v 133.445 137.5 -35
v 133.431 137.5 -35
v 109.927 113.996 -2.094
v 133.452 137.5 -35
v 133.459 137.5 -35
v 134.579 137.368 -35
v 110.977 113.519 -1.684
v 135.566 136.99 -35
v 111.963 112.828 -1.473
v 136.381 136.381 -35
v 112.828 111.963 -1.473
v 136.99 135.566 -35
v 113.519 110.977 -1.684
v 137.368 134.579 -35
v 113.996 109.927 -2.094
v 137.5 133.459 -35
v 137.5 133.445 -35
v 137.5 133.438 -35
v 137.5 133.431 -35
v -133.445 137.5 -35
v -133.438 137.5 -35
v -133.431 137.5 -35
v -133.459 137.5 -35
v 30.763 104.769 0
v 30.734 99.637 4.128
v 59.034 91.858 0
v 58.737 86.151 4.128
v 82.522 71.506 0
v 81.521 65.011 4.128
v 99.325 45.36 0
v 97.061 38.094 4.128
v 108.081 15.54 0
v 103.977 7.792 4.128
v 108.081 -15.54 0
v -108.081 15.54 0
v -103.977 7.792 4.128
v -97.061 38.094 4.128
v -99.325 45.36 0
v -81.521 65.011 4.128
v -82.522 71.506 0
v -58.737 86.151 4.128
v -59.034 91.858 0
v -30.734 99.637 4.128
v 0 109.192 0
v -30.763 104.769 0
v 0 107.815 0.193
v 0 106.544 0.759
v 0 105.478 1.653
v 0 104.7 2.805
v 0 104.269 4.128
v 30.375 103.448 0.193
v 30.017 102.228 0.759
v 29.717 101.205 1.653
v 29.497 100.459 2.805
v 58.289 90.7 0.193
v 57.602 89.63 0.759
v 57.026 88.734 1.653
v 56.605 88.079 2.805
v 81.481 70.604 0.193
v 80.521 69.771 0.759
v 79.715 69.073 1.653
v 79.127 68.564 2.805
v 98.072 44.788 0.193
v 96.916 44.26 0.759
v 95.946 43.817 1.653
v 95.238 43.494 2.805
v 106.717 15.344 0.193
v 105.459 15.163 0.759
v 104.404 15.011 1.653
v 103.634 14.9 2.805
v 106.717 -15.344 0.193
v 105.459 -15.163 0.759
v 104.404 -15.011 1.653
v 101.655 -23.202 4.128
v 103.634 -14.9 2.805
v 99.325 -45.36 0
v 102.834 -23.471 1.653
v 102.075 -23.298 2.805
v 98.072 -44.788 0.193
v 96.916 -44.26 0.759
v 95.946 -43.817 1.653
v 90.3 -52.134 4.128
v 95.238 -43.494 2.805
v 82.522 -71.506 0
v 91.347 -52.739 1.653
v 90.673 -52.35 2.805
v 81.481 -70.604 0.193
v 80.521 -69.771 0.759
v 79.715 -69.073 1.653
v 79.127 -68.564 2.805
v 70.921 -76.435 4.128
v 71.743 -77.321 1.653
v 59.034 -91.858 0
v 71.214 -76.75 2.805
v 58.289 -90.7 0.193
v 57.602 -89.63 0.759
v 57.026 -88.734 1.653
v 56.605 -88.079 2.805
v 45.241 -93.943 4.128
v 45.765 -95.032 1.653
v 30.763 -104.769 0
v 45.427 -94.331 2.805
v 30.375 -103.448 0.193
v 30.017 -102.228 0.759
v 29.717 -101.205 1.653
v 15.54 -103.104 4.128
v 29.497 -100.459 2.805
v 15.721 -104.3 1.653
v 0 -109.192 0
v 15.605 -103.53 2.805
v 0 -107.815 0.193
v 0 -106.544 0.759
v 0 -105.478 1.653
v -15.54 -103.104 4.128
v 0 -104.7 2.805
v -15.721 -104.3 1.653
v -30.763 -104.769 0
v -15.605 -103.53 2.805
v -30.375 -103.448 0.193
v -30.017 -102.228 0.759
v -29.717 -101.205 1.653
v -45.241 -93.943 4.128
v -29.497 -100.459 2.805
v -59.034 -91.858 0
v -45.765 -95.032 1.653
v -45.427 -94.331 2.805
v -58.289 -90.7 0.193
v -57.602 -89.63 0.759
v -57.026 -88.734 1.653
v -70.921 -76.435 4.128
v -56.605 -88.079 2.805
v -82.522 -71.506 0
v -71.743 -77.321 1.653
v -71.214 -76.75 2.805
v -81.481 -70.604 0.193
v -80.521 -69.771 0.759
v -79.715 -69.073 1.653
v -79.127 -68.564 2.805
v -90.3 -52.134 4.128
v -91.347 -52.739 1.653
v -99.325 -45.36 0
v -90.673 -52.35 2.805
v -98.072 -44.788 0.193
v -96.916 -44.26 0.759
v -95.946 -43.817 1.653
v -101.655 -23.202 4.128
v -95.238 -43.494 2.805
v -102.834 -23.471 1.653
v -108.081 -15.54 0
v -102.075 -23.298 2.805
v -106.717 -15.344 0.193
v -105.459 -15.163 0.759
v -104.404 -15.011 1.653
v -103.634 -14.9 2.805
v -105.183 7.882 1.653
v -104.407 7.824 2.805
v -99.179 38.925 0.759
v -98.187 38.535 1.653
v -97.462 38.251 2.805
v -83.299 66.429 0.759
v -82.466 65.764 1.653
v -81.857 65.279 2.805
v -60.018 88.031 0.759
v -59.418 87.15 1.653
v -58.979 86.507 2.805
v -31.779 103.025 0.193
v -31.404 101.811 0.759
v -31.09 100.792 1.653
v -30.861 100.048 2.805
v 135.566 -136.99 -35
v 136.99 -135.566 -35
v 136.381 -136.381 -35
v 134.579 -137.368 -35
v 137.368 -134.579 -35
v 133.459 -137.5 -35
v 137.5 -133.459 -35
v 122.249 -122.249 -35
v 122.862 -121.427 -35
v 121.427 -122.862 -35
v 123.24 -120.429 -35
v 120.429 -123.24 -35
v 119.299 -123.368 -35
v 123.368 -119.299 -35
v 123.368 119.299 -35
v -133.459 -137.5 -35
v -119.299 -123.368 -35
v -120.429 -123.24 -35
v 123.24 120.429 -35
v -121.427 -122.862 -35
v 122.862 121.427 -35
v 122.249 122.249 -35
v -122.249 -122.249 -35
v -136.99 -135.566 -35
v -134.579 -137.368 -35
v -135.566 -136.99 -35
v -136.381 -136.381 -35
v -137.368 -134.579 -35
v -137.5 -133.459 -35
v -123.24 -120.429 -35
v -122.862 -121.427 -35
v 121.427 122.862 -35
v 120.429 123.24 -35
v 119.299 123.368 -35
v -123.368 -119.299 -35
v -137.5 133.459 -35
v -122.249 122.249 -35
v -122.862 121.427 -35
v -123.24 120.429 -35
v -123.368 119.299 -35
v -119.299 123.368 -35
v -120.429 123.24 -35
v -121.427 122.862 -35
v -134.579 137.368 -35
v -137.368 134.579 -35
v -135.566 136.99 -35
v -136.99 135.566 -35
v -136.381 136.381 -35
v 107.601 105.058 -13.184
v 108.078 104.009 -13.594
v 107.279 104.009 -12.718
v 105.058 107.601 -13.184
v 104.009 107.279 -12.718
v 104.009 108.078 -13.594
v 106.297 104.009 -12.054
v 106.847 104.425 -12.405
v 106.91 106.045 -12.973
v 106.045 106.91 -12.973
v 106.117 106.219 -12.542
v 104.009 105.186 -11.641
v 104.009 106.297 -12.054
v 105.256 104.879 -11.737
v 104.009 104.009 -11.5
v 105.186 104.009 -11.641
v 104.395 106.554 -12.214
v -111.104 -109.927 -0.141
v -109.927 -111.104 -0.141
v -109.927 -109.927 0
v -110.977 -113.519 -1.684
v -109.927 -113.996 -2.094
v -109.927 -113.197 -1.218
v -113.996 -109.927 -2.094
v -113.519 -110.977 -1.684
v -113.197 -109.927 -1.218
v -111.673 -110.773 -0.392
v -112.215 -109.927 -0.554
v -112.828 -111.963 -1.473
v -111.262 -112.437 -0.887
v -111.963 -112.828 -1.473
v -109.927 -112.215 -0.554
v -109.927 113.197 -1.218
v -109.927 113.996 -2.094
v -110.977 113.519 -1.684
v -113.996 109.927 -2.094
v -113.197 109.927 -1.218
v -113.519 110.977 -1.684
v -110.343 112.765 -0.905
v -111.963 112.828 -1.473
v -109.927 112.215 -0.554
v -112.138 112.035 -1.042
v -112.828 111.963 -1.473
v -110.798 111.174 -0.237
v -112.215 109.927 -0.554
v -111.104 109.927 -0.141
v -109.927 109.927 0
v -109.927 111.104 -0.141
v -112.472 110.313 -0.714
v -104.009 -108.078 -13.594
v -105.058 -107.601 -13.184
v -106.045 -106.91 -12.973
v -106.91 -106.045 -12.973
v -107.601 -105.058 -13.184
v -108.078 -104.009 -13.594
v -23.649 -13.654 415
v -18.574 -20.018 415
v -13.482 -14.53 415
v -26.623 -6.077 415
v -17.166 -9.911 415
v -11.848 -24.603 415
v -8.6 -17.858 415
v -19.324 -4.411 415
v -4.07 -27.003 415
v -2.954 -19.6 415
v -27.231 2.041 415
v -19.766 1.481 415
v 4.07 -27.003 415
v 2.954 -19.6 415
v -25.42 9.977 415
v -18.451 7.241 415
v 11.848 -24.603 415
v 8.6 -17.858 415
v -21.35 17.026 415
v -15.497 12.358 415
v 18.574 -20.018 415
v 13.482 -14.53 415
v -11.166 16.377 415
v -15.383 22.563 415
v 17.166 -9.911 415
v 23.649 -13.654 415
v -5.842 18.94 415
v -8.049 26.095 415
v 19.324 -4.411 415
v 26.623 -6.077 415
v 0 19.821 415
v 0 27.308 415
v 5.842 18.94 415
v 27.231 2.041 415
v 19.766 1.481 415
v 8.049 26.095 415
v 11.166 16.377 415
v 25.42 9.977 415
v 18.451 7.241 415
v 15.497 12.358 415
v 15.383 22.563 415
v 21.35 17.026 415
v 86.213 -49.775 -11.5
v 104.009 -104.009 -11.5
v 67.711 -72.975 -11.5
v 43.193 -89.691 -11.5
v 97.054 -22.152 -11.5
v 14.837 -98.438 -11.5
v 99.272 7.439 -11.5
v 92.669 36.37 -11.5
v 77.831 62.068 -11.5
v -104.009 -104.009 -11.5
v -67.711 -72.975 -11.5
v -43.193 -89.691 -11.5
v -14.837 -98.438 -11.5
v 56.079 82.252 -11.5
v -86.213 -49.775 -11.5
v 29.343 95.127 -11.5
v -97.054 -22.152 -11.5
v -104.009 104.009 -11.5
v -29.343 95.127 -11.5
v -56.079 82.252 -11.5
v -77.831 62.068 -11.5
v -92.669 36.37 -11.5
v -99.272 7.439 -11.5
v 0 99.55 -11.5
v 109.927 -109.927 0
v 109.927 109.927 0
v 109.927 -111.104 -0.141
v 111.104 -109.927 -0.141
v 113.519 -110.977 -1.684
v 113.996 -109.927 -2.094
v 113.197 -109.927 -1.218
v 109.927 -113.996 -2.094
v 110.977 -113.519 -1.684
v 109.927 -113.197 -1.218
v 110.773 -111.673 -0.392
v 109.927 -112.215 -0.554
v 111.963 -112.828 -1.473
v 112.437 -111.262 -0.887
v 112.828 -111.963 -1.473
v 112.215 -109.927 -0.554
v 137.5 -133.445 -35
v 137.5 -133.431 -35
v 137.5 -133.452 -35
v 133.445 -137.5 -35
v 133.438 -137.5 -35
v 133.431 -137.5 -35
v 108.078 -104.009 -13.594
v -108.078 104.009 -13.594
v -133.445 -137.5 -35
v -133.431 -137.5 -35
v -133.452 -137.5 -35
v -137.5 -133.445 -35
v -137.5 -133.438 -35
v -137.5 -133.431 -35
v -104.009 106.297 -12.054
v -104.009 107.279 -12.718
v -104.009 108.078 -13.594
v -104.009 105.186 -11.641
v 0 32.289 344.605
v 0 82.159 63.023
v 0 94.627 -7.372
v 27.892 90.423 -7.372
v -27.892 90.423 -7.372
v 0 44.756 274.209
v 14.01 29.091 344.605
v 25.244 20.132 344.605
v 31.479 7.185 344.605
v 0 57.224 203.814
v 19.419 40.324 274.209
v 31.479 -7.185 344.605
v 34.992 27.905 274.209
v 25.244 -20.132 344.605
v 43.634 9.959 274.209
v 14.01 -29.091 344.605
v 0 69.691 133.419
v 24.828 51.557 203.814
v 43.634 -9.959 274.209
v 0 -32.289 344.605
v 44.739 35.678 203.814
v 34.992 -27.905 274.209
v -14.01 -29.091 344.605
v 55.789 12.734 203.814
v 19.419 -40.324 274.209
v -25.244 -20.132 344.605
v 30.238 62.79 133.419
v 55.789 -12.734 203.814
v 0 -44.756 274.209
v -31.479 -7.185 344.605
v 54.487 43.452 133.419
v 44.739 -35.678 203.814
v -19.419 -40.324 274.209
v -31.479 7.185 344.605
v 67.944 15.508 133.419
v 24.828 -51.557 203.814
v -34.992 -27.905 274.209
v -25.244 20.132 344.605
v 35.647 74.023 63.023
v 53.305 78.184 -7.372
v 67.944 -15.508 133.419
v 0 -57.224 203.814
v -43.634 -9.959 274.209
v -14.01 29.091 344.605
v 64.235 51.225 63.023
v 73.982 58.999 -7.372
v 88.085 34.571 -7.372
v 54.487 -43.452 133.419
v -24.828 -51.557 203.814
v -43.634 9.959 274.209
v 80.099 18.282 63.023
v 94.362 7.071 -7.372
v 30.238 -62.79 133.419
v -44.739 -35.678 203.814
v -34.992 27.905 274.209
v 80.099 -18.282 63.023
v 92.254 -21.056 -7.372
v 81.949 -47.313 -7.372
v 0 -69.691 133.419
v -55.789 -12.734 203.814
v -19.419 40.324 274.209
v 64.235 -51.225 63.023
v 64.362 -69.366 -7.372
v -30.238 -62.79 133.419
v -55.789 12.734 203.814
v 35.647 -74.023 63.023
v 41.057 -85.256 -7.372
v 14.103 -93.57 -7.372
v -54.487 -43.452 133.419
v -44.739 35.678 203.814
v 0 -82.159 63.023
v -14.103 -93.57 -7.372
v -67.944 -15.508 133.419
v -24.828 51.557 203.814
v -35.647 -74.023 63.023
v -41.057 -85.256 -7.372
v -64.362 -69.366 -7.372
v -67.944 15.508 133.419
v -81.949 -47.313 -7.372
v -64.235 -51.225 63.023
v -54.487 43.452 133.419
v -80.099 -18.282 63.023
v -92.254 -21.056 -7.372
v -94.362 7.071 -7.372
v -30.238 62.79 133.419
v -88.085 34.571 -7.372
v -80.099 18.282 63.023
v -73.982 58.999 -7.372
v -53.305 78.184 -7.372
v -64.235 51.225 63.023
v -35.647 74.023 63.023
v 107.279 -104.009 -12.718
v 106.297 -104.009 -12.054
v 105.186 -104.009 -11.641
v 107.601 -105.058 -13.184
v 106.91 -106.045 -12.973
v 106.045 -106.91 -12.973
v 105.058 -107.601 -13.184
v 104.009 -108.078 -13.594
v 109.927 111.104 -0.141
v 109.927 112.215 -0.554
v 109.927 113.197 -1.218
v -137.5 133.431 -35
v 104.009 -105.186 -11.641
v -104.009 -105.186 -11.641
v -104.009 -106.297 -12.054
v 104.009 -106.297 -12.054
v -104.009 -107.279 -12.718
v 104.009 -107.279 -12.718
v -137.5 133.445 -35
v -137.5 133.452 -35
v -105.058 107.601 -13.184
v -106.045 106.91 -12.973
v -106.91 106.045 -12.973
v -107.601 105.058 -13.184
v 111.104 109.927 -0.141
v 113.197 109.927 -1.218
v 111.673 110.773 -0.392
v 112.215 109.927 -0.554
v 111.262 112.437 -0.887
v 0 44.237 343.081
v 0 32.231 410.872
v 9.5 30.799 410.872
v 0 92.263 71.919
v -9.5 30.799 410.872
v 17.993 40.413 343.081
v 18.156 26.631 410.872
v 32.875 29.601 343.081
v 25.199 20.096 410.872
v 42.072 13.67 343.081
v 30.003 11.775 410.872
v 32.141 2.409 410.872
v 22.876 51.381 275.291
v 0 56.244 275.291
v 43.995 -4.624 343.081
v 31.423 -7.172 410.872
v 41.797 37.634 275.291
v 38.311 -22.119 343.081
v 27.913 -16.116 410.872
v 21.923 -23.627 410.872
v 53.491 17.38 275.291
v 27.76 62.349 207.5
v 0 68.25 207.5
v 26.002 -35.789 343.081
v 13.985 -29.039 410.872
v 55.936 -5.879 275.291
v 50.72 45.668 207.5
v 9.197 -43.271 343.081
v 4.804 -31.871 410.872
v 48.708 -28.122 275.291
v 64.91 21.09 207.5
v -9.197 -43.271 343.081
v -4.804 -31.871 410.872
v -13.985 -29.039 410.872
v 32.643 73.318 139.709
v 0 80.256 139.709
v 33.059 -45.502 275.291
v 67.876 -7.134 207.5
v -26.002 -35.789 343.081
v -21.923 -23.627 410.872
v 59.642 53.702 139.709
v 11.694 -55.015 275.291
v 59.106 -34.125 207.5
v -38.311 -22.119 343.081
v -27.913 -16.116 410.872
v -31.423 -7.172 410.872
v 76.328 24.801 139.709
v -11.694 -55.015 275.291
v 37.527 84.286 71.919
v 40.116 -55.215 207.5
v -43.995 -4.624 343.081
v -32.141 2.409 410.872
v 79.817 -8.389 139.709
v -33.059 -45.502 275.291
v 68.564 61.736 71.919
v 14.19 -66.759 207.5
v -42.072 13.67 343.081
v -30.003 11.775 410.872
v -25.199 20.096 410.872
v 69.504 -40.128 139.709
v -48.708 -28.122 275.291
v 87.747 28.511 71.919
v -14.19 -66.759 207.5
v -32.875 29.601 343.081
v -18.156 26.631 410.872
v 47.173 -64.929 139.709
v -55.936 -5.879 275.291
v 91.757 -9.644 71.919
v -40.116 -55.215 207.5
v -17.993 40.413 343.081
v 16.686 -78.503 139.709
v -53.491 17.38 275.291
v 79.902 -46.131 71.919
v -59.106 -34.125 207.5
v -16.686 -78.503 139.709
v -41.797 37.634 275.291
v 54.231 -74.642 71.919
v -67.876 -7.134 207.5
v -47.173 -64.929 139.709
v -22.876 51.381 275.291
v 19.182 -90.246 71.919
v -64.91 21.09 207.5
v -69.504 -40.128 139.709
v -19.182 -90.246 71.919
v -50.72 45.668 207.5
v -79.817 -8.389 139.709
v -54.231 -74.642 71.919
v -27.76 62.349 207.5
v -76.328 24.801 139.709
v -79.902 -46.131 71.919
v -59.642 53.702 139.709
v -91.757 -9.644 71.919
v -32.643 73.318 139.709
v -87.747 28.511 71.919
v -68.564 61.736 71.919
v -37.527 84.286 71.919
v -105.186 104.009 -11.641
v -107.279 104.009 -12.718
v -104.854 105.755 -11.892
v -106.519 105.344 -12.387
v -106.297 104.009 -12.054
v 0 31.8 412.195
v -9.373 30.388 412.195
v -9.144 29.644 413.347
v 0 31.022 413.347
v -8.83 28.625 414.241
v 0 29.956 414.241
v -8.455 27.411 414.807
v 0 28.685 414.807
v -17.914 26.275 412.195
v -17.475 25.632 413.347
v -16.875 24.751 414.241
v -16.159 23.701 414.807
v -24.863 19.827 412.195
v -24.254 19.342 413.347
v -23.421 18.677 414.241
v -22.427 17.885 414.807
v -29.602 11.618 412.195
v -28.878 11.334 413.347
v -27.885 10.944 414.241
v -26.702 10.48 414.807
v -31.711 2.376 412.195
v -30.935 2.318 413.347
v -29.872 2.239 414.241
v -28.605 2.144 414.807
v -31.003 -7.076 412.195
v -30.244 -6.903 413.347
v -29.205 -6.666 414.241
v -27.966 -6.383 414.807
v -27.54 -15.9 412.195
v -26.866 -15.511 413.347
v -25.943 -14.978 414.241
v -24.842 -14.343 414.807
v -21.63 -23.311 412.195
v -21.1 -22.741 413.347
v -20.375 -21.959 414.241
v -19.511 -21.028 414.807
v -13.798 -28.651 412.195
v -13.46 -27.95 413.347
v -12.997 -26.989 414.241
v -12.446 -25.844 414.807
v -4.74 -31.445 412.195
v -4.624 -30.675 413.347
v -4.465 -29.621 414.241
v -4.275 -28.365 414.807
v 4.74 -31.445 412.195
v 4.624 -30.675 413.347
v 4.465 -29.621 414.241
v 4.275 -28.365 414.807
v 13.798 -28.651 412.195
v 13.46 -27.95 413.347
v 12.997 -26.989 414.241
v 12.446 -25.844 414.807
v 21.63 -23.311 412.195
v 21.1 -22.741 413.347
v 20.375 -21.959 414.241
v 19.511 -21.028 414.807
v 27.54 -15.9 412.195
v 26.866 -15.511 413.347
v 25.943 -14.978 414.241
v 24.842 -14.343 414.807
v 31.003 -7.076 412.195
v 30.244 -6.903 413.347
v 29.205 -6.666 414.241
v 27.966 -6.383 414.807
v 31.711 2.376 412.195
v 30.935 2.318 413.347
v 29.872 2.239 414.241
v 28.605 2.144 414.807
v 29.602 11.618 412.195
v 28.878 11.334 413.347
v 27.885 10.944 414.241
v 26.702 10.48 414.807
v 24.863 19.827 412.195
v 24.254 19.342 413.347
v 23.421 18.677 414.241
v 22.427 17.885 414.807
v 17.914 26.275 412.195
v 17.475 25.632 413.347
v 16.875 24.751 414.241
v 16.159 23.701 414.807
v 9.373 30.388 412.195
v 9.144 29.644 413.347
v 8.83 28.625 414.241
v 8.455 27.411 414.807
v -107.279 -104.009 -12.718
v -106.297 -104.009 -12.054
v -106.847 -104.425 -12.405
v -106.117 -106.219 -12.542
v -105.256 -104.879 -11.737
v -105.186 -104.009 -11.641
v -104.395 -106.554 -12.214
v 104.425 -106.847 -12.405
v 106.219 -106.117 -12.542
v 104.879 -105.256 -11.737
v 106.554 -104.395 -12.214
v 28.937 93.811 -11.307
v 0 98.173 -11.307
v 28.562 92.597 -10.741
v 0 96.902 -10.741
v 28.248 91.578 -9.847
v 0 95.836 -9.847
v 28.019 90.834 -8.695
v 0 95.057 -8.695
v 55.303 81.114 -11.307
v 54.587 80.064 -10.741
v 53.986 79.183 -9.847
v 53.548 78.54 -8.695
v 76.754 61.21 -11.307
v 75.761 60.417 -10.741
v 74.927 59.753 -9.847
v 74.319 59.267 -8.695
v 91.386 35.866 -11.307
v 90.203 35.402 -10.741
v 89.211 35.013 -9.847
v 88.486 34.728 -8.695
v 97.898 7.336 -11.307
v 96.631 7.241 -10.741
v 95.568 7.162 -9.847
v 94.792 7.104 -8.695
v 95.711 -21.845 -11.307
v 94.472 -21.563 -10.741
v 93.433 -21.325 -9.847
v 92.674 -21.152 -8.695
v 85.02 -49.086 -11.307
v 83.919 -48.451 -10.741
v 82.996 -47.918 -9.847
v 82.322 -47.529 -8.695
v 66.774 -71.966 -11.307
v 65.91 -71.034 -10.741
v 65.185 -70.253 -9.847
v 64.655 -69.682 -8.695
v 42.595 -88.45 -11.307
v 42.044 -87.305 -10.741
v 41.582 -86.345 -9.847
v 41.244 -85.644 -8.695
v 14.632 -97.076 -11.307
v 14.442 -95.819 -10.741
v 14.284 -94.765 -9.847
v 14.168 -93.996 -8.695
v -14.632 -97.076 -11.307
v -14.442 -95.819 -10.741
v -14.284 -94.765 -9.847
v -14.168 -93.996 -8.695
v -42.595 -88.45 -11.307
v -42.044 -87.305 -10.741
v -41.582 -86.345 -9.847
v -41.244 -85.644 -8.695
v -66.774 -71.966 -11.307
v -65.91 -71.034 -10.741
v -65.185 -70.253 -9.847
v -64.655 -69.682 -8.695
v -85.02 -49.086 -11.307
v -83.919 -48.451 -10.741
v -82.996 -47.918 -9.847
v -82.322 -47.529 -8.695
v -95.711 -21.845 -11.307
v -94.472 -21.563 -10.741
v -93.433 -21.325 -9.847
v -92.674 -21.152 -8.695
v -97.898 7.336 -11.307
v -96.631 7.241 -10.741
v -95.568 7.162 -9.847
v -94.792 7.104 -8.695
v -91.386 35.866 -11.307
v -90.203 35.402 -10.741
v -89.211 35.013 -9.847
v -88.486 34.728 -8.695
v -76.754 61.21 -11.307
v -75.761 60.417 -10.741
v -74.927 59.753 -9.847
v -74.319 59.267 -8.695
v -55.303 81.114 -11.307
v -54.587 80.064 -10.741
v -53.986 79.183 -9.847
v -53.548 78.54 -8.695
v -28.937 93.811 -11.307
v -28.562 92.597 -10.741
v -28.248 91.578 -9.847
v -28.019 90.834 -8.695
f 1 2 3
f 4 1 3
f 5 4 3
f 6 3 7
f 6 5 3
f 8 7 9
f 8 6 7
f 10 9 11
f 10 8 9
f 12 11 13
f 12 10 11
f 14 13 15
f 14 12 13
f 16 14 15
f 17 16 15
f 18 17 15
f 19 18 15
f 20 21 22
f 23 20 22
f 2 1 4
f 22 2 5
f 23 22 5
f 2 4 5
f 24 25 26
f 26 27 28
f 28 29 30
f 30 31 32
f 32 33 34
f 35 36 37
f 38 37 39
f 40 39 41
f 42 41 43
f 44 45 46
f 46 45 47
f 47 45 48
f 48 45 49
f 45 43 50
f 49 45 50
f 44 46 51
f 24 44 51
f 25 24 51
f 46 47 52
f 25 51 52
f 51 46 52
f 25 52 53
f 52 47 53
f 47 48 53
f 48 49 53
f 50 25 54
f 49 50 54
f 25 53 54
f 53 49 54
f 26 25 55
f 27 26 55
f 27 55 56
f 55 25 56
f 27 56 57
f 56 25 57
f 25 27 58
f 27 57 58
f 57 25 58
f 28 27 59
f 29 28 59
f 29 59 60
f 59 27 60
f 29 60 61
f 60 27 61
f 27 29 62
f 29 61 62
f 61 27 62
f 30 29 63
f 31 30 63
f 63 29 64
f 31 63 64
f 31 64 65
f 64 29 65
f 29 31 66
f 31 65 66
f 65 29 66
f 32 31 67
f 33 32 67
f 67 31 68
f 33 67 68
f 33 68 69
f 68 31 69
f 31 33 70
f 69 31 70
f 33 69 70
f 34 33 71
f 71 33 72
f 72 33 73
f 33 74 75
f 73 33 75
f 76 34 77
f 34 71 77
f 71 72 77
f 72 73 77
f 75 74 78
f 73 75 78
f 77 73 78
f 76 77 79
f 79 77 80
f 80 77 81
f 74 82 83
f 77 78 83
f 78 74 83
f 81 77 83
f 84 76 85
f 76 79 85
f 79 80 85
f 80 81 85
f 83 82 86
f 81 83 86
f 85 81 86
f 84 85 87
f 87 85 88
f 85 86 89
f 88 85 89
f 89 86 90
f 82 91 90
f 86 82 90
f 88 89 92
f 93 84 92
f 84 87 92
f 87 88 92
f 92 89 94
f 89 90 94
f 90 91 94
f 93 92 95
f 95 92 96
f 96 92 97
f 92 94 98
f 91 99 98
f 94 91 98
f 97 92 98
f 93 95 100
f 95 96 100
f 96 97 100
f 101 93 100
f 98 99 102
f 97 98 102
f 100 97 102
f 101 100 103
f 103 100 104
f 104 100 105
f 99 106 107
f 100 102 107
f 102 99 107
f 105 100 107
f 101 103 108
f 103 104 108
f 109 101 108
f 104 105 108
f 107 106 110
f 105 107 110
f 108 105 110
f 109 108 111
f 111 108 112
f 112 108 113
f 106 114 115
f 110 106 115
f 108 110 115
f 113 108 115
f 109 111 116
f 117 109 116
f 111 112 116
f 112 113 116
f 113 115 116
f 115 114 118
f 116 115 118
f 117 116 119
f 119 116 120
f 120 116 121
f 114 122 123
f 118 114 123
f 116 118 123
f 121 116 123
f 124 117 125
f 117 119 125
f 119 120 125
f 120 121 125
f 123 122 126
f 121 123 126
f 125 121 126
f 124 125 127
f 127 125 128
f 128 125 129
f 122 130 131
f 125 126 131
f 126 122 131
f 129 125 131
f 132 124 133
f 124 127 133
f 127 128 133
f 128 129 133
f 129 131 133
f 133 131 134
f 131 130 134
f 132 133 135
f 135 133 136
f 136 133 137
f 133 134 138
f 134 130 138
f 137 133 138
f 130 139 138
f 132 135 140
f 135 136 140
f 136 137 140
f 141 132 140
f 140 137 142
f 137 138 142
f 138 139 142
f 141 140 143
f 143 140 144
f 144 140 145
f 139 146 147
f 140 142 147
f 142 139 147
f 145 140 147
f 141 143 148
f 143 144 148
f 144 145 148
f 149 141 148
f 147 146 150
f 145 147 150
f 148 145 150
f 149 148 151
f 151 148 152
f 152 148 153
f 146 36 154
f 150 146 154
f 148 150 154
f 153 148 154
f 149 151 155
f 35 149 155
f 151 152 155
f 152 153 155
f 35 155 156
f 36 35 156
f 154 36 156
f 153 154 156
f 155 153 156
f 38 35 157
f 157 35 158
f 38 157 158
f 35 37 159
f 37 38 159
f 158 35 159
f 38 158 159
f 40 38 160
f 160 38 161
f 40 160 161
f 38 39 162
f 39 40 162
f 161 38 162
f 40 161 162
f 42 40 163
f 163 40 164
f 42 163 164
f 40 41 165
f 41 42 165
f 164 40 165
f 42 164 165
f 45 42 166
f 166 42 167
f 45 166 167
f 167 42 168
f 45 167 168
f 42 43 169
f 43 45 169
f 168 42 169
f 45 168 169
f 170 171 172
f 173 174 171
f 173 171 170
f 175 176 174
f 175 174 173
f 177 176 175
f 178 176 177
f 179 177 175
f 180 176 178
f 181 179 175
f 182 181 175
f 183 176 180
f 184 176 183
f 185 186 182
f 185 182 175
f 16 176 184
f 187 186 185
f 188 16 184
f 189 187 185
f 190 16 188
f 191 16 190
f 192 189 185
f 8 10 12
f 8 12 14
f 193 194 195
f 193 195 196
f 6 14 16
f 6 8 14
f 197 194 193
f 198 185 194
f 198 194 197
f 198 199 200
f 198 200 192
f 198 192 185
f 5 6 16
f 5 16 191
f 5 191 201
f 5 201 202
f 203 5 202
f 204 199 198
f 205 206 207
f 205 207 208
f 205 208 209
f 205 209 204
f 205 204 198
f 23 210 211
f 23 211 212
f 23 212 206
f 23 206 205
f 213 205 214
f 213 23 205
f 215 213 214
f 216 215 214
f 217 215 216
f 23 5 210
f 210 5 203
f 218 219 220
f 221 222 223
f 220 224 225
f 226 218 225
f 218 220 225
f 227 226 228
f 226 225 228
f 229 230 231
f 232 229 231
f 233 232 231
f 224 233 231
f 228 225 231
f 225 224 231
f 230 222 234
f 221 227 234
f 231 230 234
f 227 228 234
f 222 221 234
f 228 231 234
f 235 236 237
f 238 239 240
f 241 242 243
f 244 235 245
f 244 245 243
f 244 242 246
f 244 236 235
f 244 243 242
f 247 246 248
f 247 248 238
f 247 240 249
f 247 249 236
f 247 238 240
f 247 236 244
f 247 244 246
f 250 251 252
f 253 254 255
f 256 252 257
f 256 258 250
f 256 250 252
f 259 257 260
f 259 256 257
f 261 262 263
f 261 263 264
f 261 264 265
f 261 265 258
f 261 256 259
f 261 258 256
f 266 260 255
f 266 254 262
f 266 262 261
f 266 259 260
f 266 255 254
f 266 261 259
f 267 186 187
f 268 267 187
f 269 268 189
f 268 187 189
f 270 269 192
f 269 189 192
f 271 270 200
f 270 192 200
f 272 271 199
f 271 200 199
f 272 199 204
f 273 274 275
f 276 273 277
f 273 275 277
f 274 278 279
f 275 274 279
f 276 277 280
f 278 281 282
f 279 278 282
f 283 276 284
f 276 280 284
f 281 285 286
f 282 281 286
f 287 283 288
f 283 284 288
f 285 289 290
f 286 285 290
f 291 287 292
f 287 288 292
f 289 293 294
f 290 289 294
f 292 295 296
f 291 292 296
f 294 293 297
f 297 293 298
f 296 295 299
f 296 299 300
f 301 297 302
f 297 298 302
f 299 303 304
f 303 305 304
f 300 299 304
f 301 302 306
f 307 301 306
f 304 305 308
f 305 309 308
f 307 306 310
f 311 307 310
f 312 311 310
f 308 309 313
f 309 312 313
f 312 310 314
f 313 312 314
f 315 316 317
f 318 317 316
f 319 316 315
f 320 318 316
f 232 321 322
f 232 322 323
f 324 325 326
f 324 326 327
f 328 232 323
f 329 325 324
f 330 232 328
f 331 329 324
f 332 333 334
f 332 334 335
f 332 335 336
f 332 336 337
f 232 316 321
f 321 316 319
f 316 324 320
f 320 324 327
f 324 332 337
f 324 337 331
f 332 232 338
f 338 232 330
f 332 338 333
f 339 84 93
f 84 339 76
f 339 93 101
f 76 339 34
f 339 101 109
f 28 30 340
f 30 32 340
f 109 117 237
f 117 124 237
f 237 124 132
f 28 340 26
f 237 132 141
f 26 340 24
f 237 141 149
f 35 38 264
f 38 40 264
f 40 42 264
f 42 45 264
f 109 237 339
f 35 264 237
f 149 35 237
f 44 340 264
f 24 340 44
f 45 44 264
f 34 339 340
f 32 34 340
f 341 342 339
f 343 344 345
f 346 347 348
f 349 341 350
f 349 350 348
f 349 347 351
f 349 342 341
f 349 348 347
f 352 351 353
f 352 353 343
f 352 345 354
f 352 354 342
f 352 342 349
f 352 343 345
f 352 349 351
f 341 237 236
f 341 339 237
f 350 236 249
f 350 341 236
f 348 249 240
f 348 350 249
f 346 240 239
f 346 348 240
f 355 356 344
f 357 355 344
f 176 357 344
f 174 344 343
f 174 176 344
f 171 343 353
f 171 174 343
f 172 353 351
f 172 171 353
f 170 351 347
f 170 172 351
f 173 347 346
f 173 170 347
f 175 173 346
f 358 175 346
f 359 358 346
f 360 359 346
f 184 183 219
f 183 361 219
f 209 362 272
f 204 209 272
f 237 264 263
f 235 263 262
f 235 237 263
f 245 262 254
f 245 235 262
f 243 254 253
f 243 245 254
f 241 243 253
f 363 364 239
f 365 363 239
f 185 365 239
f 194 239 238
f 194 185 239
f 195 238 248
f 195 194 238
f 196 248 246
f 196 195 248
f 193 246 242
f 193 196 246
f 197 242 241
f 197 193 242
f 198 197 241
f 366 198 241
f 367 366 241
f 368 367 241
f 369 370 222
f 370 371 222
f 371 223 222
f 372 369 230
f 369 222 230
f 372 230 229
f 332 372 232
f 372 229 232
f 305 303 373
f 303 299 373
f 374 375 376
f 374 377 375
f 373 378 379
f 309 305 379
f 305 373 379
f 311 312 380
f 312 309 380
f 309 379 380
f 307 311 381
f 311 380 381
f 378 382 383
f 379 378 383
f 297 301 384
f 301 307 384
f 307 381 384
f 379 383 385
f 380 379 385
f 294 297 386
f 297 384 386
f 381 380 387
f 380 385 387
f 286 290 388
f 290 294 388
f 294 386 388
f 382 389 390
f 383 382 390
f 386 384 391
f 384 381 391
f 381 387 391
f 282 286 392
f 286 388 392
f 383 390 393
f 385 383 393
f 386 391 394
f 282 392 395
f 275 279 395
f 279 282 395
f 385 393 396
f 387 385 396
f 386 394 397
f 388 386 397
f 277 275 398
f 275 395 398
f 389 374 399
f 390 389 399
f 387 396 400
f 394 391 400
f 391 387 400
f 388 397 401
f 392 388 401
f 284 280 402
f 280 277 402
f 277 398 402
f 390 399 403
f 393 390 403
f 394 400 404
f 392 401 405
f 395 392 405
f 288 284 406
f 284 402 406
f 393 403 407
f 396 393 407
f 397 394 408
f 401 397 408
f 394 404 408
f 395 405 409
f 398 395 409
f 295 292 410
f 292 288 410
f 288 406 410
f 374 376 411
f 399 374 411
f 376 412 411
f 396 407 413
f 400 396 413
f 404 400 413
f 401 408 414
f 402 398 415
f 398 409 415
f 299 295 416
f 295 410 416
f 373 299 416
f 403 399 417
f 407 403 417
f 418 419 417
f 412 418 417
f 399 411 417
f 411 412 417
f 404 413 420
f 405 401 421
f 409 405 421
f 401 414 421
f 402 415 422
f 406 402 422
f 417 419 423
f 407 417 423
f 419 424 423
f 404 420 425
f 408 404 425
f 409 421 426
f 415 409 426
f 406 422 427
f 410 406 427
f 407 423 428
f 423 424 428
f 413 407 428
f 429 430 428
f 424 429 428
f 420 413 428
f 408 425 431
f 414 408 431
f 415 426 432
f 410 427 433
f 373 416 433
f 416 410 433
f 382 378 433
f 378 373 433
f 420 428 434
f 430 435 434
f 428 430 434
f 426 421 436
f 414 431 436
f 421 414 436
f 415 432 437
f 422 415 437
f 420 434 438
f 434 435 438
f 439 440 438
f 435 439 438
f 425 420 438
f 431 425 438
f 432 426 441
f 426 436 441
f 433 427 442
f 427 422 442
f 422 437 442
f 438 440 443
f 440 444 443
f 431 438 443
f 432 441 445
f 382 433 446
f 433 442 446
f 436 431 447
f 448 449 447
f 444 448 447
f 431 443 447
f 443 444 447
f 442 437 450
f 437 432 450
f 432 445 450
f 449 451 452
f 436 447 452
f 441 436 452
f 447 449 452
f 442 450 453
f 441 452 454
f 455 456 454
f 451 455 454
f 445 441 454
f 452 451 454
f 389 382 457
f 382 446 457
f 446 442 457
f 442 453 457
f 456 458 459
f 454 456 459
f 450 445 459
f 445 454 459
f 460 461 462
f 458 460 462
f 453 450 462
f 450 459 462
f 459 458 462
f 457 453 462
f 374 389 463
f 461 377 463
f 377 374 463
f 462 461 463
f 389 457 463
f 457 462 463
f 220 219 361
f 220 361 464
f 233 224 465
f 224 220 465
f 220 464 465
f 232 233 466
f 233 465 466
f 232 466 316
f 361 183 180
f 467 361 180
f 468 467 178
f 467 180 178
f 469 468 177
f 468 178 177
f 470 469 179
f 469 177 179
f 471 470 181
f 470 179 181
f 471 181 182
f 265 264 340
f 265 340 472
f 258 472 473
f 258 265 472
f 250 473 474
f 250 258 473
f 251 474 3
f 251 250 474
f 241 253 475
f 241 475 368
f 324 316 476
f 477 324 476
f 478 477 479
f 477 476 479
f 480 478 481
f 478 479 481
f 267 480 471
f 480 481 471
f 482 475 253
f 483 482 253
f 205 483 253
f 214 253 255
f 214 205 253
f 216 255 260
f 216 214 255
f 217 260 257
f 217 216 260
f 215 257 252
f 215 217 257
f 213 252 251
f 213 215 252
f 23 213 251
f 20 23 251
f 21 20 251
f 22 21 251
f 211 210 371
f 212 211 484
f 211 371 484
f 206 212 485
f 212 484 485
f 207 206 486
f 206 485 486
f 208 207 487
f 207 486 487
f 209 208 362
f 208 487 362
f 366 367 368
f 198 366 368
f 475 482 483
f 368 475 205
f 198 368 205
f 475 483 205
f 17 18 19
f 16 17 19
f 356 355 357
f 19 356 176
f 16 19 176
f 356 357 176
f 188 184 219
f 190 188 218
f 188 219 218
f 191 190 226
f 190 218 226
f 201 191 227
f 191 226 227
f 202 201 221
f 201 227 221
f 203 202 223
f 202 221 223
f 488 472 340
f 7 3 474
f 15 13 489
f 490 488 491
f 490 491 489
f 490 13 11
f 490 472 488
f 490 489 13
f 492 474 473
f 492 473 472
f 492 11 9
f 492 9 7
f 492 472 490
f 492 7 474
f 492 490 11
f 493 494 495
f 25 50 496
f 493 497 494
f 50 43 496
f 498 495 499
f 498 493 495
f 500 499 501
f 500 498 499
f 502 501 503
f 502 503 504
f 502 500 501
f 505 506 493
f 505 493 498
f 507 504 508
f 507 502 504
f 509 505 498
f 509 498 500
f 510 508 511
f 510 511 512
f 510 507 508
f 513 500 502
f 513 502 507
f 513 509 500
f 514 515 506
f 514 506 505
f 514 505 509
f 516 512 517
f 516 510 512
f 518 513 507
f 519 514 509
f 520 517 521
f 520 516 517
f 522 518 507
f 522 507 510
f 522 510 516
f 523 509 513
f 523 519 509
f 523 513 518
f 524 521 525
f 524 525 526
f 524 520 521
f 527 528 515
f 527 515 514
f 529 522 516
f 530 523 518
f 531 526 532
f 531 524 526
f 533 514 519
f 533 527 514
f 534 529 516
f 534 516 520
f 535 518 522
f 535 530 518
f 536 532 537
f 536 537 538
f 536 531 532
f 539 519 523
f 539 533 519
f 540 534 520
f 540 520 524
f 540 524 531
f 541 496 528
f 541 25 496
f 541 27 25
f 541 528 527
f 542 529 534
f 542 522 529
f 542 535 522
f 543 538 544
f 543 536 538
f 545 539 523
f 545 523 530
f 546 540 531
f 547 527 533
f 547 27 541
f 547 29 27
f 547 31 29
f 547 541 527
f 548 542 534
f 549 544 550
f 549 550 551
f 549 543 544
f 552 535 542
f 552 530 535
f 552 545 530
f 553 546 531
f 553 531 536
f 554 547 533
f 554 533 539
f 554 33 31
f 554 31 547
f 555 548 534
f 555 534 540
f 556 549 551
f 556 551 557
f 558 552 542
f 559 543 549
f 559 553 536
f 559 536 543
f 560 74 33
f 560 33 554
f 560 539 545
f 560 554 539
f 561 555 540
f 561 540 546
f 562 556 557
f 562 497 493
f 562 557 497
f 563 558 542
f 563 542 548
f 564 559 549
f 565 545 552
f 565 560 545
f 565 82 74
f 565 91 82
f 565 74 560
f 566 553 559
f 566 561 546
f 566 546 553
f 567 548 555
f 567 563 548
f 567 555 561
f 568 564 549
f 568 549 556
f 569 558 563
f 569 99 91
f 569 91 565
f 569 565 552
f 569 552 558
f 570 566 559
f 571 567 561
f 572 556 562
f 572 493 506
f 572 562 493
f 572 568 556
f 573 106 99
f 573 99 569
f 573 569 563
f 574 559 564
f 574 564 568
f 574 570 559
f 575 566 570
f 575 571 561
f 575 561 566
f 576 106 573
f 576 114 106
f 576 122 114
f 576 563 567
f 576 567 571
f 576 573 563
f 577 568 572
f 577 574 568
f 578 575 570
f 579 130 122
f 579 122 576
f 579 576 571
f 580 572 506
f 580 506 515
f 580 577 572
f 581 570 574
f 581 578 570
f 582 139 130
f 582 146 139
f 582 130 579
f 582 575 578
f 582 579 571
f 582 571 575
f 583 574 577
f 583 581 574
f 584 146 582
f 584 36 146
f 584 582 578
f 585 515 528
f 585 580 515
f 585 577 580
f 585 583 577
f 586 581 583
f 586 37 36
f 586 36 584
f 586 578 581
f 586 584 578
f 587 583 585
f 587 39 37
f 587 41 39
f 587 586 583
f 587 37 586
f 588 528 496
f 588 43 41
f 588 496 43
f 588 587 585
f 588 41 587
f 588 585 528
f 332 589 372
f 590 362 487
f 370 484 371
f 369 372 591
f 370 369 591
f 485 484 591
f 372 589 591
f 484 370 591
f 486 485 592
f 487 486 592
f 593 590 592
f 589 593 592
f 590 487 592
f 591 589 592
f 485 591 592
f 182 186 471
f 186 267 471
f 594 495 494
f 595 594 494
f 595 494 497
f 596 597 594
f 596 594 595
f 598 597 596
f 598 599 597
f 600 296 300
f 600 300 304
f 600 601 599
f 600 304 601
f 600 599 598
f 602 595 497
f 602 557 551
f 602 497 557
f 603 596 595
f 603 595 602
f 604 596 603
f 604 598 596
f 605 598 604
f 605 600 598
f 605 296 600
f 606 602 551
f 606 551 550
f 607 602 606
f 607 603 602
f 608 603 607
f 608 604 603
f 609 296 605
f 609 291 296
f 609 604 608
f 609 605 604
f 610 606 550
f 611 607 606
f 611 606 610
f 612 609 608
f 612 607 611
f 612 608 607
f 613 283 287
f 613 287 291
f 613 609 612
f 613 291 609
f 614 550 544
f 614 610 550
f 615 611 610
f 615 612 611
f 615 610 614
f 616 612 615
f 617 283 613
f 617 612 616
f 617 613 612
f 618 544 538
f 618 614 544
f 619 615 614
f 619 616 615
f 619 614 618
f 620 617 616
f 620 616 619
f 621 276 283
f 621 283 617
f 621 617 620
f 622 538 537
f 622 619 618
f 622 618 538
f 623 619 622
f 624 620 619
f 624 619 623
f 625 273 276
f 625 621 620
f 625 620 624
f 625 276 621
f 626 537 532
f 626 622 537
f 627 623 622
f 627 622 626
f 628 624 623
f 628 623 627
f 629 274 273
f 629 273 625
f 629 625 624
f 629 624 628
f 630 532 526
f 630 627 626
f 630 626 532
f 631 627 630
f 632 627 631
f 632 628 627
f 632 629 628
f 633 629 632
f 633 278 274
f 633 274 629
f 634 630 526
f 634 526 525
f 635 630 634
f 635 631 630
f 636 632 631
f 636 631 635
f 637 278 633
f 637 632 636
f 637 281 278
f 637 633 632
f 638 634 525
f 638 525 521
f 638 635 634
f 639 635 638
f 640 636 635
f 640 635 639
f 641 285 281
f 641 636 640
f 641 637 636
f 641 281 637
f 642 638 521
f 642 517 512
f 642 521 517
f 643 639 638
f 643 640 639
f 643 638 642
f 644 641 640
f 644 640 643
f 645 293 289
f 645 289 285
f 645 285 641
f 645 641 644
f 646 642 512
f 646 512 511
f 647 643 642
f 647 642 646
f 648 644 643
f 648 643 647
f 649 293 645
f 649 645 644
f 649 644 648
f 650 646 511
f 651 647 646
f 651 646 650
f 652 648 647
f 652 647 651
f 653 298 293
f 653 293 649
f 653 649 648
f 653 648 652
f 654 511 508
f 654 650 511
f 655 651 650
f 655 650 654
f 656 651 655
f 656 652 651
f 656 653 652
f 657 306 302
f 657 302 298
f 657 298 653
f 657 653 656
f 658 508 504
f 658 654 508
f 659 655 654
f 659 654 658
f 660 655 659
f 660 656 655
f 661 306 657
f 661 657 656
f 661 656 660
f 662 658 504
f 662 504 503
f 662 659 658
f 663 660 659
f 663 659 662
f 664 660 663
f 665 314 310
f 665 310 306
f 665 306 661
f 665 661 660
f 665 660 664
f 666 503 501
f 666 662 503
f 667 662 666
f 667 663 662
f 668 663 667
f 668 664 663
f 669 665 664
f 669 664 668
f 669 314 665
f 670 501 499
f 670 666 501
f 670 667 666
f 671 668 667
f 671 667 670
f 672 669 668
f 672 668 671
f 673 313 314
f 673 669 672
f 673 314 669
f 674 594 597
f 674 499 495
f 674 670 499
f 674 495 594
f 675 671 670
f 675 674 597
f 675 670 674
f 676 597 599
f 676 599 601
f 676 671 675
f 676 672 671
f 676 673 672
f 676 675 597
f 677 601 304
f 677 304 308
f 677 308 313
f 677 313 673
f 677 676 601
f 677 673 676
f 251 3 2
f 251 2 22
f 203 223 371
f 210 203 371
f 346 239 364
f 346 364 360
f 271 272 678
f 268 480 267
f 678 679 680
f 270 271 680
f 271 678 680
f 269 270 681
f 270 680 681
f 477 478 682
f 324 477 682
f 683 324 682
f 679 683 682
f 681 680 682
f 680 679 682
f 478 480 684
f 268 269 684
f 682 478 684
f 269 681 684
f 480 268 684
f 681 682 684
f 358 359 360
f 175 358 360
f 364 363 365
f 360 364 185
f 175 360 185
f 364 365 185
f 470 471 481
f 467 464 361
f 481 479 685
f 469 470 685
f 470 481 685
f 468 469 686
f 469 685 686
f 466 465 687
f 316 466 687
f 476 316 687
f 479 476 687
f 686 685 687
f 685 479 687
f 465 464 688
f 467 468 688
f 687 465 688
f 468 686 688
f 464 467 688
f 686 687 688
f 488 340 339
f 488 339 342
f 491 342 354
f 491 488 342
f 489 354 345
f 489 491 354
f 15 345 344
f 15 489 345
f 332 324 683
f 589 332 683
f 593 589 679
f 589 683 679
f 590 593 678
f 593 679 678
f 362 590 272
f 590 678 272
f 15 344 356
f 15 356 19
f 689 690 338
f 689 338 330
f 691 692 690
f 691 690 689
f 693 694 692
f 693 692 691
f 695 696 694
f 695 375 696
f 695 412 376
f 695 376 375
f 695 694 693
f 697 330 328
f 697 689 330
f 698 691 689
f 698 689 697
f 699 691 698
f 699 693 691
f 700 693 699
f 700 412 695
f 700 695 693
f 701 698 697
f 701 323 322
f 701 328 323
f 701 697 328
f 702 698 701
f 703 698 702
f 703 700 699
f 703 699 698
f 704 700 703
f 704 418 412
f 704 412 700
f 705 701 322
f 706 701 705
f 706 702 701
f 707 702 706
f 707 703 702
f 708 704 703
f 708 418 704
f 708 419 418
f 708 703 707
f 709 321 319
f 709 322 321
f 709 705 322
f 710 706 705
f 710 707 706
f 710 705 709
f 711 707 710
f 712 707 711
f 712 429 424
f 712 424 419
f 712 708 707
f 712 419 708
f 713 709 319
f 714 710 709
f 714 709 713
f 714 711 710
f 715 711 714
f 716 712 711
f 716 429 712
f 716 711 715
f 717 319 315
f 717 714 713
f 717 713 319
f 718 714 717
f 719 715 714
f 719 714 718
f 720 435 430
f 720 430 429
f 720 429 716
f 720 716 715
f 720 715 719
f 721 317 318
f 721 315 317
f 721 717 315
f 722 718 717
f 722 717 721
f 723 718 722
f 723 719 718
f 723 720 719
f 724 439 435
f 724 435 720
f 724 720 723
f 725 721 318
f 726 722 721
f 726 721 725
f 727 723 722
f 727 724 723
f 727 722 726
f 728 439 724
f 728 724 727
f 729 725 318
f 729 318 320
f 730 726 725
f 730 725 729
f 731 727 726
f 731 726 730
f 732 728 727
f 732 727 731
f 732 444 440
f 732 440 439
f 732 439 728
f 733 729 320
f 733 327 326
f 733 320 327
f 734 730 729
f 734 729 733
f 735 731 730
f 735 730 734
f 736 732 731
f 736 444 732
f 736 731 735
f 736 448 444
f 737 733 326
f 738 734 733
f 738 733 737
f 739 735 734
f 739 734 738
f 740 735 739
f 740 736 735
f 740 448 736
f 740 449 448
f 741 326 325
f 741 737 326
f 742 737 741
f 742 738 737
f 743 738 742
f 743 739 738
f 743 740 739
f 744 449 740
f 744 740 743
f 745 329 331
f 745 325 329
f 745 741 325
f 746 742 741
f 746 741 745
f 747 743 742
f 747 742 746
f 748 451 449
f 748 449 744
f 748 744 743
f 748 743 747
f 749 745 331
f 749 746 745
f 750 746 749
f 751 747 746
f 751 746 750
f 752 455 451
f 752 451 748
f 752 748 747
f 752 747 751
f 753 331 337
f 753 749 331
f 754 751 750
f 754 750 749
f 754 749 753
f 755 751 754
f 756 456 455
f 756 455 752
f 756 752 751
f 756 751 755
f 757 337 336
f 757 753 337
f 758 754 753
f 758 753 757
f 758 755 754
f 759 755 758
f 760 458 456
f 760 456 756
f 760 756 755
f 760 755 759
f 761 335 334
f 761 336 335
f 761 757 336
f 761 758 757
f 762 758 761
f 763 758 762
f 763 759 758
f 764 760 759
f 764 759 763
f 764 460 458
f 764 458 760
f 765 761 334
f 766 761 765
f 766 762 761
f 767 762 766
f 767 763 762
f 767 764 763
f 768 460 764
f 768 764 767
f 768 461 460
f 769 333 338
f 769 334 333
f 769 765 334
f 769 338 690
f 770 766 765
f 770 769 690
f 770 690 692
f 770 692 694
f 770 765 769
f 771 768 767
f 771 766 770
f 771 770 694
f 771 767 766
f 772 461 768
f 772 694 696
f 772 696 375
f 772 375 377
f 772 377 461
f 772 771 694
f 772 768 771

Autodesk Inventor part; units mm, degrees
ref_plane "YZ Plane" through (0, 0, 0) normal (1, 0, 0) x (0, 1, 0)
ref_plane "XZ Plane" through (0, 0, 0) normal (0, 1, 0) x (-1, 0, 0)
ref_plane "XY Plane" through (0, 0, 0) normal (0, 0, 1) x (1, 0, 0)
sketch "スケッチ1" plane through (0, 0, 0) normal (1, 0, 0) x (0, 1, 0)
  line L0 (0, 0) -> (105, 0)
  line L1 (105, 0) -> (31.5, 415)
  line L2 (31.5, 415) -> (0, 415)
  line L3 (0, 415) -> (0, 0)
  dimension "d0" = 415
  dimension "d1" = 31.5
  dimension "d2" = 105
revolve "回転1" add sketch "スケッチ1" angle 360 about axis through (0, 0, 415) along (0, 0, -1)
sketch "スケッチ2" plane through (0, 0, 0) normal (0, 0, -1) x (-1, 0, 0)
  line L0 (-137.5, -137.5) -> (137.5, -137.5)
  line L1 (137.5, -137.5) -> (137.5, 137.5)
  line L2 (137.5, 137.5) -> (-137.5, 137.5)
  line L3 (-137.5, 137.5) -> (-137.5, -137.5)
  line L4 (-137.5, -137.5) -> (137.5, 137.5) construction
  line L5 (137.5, -137.5) -> (-137.5, 137.5) construction
  point P0 (0, 0)
  dimension "d4" = 275
  dimension "d5" = 275
extrude "押し出し1" add sketch "スケッチ2" along normal blind 35
chamfer "面取り3" distance 35 distance2 25 1 edges at (0, 137.5, 0) measured on face at (-45.8333, 137.5, -11.6667)
chamfer "面取り4" distance 35 distance2 25 1 edges at (137.5, -12.5, 0) measured on face at (137.5, 37.5, -23.3333)
chamfer "面取り5" distance 35 distance2 25 1 edges at (-12.5, -137.5, 0) measured on face at (37.5, -137.5, -23.3333)
chamfer "面取り6" distance 35 distance2 25 1 edges at (-137.5, 0, 0) measured on face at (-137.5, -37.5, -23.3333)
shell "シェル1" thickness 11.5 removed faces 2 at (9.3296, 8.757, 415) at (45.8333, -45.8333, -35)
fillet "フィレット2" radius 5 19 edges at (0, -31.5, 415) (112.5001, 0, 0) (0, -112.5001, 0) (125, -125.0001, -17.5) (0, -105, 0) (125.0001, 125, -17.5) (0, 112.5001, 0) (-112.5001, 0, 0) (-125.0001, 125, -17.4999) (-125.0001, -125, -17.5) (0, -95.3578, -11.5) (0, -106.582, -11.5) (-106.582, 0, -11.5) (-114.9748, -114.9748, -23.25) (0, 106.582, -11.5) (106.582, 0, -11.5) (114.9748, 114.9748, -23.25) (-114.9748, 114.9748, -23.25) (114.9748, -114.9748, -23.25)
equation "\"d5\" = d4"
properties part number "mini_corn"
